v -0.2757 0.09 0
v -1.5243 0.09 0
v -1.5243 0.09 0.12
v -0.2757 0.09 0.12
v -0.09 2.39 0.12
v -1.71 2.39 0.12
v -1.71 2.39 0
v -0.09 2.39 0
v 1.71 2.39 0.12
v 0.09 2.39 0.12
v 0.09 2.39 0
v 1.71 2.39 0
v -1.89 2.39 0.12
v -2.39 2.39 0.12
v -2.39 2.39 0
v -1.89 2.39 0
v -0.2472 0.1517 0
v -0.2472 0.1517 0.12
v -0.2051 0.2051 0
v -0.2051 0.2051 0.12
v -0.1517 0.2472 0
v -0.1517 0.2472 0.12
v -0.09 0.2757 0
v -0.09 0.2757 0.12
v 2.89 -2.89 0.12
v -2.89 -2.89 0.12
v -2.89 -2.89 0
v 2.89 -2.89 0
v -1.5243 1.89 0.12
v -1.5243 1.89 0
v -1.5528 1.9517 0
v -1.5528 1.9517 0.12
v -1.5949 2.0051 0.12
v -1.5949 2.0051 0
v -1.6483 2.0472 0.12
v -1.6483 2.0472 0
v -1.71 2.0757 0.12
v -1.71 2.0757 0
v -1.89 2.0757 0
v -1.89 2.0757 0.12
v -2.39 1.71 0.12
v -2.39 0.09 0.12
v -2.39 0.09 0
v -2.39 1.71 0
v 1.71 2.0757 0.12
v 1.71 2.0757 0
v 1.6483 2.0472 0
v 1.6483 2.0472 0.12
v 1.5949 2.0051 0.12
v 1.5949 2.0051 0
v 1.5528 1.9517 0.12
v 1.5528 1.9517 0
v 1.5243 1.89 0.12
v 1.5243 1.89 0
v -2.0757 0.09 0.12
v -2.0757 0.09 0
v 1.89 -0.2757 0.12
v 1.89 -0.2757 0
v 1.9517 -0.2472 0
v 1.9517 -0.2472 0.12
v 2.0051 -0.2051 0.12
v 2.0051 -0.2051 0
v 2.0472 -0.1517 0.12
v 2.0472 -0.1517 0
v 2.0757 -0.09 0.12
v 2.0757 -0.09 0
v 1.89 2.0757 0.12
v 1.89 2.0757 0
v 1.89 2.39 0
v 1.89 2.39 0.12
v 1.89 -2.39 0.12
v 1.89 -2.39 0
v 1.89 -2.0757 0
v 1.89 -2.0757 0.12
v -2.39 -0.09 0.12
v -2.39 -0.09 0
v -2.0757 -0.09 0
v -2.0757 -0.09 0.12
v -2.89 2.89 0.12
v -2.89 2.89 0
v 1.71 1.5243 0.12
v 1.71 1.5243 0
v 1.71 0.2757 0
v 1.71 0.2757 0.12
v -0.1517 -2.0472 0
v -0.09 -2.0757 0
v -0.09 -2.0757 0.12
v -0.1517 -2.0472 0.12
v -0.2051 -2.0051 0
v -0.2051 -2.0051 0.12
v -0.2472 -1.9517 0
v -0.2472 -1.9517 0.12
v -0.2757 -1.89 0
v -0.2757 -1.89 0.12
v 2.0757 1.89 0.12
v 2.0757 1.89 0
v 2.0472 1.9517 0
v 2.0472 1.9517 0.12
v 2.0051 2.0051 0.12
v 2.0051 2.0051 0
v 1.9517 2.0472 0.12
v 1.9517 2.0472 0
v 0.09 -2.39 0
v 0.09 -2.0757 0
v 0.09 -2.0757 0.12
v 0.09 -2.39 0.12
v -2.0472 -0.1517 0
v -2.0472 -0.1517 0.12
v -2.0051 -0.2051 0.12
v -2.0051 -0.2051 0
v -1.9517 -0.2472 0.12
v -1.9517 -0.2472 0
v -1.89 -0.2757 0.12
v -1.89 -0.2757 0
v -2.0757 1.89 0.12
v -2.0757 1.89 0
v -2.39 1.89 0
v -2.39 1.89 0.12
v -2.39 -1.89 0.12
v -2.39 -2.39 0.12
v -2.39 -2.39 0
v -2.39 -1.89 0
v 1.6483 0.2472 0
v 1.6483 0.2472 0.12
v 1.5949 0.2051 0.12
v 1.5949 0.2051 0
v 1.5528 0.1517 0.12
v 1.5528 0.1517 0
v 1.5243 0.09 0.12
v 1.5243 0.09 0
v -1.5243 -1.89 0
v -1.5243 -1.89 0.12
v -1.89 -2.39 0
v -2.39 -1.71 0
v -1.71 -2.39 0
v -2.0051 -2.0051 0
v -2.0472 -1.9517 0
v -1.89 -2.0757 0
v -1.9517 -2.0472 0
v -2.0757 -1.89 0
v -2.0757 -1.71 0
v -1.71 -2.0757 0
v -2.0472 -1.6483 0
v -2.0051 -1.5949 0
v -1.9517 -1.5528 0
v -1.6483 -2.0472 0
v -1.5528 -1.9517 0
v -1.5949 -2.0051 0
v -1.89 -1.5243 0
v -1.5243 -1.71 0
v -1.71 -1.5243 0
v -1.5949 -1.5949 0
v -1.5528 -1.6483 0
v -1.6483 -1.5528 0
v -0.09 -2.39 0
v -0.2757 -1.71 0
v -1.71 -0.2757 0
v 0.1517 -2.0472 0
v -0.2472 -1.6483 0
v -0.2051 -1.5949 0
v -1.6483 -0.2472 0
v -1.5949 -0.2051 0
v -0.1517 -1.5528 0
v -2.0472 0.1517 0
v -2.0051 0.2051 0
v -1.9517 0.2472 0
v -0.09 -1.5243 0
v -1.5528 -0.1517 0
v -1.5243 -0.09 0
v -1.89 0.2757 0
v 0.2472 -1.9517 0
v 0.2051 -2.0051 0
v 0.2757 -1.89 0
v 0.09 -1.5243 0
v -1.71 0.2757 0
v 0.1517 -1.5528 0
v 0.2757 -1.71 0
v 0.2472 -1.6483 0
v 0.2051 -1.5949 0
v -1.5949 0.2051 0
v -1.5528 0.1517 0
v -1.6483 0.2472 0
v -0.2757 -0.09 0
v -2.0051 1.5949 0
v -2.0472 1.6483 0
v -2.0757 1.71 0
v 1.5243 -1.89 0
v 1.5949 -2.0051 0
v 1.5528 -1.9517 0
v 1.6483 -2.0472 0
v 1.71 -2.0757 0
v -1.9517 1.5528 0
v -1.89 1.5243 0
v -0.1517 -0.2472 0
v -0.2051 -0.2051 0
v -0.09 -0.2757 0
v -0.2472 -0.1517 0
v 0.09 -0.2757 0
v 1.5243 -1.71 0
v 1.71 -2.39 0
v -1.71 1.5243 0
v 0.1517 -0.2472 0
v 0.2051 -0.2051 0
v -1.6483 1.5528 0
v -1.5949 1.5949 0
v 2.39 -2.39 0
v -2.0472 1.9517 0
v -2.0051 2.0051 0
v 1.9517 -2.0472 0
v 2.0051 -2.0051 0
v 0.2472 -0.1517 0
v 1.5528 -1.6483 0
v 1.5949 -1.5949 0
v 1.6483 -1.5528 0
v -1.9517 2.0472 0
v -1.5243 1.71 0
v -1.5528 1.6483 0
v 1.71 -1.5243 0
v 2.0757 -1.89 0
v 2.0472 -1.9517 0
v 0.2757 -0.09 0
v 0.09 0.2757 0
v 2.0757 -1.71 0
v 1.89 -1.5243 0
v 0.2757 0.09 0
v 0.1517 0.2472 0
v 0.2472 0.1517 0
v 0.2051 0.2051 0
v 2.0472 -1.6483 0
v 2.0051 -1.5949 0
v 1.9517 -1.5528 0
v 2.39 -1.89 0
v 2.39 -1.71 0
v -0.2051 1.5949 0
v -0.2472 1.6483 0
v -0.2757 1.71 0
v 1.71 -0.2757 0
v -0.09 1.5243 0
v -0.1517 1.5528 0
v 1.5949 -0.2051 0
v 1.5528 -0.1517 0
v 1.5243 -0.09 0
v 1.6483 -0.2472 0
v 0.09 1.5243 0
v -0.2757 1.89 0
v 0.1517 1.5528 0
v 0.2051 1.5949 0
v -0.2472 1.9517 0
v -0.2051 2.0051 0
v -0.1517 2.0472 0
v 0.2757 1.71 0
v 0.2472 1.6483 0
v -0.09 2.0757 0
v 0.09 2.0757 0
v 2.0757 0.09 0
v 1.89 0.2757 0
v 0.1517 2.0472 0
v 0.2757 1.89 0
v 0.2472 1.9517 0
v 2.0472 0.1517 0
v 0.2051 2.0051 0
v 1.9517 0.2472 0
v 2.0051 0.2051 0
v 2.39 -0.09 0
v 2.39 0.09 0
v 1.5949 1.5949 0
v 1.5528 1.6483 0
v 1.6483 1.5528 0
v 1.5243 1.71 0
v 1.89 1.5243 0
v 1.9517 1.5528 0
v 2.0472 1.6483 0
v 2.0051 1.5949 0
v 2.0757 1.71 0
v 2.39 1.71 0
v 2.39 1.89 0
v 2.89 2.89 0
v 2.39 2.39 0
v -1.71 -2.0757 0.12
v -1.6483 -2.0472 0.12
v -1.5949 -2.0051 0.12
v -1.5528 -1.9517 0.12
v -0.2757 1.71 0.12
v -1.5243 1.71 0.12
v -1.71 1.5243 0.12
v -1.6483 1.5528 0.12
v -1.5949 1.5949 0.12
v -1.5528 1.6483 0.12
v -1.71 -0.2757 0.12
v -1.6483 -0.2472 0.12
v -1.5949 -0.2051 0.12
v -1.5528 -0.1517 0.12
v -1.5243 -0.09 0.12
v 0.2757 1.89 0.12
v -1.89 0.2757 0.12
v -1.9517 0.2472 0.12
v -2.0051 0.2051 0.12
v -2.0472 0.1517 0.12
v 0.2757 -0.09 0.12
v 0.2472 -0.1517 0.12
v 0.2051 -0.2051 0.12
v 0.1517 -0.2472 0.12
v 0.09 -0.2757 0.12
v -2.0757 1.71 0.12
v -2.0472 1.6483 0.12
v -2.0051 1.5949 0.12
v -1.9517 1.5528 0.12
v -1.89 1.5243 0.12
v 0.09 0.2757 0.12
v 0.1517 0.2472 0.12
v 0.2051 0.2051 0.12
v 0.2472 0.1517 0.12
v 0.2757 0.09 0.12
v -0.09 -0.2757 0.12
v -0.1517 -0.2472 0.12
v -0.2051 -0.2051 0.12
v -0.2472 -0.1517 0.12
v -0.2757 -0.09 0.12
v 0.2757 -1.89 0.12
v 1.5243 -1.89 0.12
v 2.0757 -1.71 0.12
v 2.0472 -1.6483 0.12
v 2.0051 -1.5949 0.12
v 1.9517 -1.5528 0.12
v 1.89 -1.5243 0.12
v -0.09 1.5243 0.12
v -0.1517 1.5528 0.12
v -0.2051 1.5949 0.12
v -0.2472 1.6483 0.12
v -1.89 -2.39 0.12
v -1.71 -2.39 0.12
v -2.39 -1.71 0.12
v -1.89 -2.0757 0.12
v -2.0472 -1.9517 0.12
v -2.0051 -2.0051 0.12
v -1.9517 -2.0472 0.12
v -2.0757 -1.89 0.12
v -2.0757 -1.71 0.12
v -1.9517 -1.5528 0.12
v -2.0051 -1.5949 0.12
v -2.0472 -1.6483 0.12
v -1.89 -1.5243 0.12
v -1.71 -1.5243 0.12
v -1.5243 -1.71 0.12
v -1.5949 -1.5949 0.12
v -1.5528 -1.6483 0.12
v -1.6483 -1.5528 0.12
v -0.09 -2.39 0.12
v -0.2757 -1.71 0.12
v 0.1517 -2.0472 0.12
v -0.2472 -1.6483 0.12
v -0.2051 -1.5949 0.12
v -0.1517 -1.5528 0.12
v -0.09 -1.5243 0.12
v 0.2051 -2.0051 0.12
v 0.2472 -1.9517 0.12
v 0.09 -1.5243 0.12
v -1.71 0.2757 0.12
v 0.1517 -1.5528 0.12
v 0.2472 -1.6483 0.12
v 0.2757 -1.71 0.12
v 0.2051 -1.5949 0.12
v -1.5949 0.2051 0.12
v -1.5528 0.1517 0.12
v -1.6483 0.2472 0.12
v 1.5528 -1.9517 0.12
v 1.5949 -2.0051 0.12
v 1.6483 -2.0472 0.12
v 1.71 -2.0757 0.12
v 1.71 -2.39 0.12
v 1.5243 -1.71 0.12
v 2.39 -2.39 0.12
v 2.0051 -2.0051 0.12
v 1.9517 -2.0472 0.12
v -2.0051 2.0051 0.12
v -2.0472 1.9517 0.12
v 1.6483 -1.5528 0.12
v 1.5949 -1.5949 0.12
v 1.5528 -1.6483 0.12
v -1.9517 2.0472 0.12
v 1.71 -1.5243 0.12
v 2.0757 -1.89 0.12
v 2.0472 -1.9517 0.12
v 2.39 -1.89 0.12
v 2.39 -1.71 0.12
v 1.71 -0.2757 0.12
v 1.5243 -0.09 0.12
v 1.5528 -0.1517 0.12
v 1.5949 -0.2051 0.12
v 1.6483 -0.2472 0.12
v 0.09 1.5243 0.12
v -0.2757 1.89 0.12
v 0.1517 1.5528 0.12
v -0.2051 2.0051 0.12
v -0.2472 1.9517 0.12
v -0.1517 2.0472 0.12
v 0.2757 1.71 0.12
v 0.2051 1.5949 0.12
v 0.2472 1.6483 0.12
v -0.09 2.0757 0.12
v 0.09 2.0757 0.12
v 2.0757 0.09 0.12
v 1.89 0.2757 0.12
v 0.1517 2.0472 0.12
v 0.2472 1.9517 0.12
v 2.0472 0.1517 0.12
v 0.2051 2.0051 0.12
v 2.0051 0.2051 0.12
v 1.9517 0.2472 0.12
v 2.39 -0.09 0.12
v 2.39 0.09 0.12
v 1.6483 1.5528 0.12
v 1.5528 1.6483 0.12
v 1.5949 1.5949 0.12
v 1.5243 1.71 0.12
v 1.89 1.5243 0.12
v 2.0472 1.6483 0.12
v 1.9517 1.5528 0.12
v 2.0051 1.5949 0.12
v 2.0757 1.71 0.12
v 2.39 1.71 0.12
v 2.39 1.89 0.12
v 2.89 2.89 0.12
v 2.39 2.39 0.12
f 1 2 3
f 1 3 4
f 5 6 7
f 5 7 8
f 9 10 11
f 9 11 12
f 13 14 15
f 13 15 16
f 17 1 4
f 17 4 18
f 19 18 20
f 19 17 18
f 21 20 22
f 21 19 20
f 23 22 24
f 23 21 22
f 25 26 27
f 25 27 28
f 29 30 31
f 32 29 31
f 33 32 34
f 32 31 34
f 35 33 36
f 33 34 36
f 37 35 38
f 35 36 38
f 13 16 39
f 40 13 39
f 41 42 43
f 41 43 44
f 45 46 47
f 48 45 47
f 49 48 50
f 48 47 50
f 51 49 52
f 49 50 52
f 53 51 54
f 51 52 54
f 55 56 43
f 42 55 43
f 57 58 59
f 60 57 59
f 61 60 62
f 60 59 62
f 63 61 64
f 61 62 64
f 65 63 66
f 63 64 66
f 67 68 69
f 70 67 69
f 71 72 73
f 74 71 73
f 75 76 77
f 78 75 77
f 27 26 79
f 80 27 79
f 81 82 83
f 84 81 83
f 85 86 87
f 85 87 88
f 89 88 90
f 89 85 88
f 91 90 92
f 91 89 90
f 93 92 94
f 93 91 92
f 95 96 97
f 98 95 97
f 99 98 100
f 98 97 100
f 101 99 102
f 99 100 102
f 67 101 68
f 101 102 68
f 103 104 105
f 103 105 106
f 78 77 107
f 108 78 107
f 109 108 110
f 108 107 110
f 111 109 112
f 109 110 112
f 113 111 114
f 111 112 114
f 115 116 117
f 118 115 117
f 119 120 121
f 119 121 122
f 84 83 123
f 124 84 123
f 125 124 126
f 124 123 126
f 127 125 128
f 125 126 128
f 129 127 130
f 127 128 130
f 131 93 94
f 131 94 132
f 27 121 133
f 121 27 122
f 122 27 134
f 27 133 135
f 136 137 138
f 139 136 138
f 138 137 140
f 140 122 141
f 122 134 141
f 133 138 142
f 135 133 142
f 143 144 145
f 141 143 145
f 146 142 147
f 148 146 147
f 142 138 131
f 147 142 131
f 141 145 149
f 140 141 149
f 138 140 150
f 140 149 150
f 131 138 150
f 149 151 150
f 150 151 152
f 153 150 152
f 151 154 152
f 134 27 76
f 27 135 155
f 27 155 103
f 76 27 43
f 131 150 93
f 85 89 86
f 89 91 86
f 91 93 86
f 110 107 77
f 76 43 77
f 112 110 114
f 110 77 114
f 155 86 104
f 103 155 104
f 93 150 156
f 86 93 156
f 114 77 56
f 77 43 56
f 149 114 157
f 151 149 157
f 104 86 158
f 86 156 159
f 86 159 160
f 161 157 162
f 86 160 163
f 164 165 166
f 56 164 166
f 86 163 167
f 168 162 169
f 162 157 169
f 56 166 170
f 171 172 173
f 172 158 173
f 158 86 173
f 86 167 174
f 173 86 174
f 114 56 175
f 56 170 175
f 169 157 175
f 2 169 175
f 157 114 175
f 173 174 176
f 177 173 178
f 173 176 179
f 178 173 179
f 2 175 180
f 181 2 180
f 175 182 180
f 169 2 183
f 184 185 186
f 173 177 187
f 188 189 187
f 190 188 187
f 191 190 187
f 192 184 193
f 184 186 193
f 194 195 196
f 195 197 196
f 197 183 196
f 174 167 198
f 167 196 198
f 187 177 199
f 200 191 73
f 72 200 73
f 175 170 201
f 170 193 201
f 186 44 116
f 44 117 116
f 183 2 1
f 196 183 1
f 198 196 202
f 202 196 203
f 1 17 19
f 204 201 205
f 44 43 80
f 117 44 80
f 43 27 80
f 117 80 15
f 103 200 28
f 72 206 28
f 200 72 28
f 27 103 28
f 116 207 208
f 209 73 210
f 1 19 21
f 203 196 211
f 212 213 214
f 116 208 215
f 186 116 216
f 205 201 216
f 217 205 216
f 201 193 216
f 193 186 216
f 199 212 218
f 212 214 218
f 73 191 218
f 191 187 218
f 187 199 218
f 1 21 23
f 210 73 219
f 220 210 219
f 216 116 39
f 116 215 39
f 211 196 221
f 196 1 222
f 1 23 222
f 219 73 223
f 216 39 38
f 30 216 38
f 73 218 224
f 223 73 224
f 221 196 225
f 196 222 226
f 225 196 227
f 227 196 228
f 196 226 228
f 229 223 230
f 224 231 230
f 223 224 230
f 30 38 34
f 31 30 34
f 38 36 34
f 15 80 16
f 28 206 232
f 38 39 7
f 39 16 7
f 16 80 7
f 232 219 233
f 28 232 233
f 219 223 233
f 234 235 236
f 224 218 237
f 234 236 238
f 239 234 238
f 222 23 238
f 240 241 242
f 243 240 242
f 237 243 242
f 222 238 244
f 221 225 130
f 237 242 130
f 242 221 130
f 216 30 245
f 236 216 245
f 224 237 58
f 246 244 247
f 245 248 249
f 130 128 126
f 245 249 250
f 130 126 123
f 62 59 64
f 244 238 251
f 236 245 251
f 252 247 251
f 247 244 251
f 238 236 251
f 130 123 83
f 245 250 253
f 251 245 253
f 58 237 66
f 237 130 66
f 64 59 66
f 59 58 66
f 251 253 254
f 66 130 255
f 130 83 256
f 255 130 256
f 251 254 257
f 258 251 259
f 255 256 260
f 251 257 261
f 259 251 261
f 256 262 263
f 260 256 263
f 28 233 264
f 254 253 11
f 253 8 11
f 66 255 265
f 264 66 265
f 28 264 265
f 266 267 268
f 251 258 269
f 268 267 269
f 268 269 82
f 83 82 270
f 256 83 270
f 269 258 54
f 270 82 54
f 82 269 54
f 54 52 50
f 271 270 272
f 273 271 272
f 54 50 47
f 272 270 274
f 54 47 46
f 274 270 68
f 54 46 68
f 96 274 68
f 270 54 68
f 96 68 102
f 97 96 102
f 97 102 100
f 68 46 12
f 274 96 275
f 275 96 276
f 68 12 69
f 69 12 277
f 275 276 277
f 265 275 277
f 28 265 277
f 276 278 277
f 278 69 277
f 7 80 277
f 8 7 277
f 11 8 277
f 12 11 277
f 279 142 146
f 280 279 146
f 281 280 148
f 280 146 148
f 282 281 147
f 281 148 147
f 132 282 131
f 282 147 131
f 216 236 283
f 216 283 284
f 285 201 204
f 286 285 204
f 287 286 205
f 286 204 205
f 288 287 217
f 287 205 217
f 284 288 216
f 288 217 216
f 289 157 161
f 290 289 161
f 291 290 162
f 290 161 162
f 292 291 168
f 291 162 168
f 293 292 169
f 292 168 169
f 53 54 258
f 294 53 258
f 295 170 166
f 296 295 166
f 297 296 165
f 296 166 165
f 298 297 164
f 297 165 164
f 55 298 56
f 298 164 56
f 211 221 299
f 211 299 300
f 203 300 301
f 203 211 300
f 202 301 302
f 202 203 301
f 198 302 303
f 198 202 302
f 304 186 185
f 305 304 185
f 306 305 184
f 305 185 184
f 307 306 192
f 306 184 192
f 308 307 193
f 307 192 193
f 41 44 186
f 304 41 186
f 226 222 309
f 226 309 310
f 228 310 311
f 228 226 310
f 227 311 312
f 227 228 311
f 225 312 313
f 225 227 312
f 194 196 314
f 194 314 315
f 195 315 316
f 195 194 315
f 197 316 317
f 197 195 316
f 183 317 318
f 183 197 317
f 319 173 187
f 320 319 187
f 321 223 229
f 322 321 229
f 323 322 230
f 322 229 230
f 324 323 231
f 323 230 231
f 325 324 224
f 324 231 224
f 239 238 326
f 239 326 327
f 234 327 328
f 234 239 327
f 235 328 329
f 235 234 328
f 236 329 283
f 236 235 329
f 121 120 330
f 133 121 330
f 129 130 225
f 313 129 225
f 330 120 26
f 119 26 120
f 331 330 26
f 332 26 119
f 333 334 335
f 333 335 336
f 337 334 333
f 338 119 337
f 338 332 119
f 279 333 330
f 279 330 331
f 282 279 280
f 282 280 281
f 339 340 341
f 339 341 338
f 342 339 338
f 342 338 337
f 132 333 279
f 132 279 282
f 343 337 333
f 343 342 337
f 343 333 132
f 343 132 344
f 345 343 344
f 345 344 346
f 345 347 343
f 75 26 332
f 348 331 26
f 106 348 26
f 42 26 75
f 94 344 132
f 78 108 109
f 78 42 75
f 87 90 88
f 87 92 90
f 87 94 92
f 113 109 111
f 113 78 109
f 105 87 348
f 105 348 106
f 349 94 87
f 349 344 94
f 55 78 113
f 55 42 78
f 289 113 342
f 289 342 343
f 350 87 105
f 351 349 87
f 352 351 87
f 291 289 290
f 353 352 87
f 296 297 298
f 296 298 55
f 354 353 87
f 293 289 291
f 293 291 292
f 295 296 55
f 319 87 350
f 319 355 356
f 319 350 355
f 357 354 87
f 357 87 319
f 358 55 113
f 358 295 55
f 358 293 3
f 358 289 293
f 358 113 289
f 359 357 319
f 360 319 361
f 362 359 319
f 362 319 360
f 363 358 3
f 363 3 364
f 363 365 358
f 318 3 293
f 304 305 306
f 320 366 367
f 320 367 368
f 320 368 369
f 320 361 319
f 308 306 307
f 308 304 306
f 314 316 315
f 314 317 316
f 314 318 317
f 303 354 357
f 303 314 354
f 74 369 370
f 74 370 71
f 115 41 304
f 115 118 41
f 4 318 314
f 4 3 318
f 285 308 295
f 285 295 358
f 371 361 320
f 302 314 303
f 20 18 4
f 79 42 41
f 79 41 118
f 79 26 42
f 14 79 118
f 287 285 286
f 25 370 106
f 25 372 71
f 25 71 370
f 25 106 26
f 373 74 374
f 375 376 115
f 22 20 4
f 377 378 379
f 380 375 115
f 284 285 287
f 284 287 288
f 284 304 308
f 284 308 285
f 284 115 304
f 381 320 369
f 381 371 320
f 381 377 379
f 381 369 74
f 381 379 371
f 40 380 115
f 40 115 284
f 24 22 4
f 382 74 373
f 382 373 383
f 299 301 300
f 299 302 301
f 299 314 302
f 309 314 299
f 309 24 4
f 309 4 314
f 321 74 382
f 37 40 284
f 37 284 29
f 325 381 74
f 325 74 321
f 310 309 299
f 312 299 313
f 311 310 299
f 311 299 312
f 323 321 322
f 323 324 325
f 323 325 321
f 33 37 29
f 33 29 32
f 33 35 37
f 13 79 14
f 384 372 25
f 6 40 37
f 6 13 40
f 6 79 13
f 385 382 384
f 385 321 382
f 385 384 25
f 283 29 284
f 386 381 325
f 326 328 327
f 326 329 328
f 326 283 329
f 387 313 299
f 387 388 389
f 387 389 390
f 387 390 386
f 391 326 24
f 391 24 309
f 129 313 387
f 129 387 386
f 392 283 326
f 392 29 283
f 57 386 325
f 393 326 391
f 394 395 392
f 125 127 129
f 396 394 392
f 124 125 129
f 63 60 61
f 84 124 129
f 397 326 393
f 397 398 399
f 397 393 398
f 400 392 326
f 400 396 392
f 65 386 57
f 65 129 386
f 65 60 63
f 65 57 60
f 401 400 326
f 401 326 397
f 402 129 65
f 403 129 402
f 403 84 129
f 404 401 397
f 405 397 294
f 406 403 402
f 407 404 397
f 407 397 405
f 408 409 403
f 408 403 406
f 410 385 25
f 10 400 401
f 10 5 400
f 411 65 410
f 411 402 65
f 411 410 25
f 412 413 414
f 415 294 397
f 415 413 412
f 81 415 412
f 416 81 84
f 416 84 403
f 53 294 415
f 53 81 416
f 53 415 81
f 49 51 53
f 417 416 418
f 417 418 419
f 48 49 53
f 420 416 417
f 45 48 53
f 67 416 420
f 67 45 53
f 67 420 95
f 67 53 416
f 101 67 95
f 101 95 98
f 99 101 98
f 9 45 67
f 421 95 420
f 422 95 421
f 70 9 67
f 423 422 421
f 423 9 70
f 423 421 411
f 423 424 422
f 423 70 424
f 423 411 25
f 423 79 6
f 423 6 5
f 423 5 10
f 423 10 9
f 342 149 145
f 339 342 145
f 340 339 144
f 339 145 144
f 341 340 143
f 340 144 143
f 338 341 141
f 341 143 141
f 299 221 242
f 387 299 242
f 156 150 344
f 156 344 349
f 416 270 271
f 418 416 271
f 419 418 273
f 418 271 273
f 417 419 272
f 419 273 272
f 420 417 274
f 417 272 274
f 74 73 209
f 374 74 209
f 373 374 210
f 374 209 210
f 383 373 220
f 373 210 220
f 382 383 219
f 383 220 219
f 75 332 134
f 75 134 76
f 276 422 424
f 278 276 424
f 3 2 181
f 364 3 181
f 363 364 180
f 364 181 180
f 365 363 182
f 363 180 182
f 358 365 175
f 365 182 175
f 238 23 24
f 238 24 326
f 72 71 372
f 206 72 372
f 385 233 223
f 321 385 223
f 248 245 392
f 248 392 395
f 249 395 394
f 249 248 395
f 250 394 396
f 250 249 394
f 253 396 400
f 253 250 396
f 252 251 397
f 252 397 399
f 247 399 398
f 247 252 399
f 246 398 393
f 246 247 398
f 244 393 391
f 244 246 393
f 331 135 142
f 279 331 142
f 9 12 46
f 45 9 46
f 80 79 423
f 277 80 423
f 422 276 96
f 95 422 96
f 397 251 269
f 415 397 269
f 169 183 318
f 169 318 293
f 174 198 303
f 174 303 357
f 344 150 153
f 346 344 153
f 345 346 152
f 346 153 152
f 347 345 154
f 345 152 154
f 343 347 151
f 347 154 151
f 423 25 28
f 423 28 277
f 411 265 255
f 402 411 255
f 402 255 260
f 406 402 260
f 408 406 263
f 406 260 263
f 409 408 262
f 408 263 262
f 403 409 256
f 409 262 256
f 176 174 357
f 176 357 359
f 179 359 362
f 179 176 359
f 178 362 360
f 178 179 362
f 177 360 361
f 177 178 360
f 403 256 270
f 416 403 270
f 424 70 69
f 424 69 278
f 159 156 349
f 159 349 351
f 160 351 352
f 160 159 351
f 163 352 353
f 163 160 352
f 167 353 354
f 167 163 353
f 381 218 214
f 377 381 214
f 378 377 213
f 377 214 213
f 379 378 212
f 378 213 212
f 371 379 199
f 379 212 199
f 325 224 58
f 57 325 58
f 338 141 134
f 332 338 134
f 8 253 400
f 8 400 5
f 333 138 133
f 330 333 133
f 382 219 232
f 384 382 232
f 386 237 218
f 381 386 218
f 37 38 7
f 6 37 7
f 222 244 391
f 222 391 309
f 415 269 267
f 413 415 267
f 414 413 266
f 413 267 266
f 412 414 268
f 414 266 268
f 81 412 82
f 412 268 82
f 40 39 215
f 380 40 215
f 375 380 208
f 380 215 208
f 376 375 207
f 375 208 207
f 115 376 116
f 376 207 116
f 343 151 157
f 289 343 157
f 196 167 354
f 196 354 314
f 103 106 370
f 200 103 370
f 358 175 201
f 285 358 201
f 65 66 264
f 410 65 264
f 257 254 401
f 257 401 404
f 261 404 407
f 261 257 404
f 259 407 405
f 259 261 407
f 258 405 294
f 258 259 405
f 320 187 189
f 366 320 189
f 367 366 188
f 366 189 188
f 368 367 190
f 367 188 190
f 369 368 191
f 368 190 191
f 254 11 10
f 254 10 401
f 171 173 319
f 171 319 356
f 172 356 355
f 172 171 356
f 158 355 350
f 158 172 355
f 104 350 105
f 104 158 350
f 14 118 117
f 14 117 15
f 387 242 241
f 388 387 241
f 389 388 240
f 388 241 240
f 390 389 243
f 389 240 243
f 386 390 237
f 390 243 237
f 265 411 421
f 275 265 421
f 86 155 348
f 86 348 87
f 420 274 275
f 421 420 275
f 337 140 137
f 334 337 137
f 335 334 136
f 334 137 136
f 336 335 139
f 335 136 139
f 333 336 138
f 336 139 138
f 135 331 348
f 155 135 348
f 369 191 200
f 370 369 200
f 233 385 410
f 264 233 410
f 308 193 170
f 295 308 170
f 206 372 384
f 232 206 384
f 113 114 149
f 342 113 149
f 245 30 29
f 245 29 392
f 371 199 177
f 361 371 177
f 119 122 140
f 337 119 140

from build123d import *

# Parameters (mm, degrees)
BOSS_EXTRUDE2_DEPTH        = 0.12
CIRPATTERN2_COUNT          = 4
LPATTERN5_COUNT            = 2
LPATTERN5_PITCH            = 1.8
LPATTERN5_COPY_1_DEPTH     = 0.12
LPATTERN5_COPY_2_DEPTH     = 0.12
LPATTERN5_COPY_3_DEPTH     = 0.12
LPATTERN5_COL_COUNT        = 2
LPATTERN5_COL_PITCH        = 1.8
LPATTERN5_COL_COPY_1_DEPTH = 0.12
LPATTERN5_COL_COPY_2_DEPTH = 0.12
LPATTERN5_COL_COPY_3_DEPTH = 0.12
LPATTERN6_DEPTH            = 0.12
SKETCH3_W                  = 8
SKETCH3_H                  = 8
SKETCH3_W_2                = 4.78
SKETCH3_H_2                = 4.78
CUT_EXTRUDE8_DEPTH         = 4.820261771
SKETCH7_W                  = 5.78
SKETCH7_H                  = 5.78
SKETCH7_W_2                = 4.78
SKETCH7_H_2                = 4.78
BOSS_EXTRUDE3_DEPTH        = 0.12


# Read off the part's stored shape, not the designer's step: LPattern6
with BuildPart() as part:
    # Sketch2 → Boss-Extrude2 (new body)
    with BuildSketch(Plane.XY):
        with BuildLine():
            Line((0.09, 0.9), (0.09, 0.275680975))
            ThreePointArc((0.09, 0.275680975), (0, -0.29), (-0.09, 0.275680975))
            Line((-0.09, 0.275680975), (-0.09, 0.9))
            Line((-0.09, 0.9), (0.09, 0.9))
        make_face()
    boss_extrude2 = extrude(amount=BOSS_EXTRUDE2_DEPTH)

    # CirPattern2: Boss-Extrude2 ×4 about axis
    cirpattern2_axis = Axis((0, 0, 0), (0, 0, 1))
    for i in range(1, CIRPATTERN2_COUNT):
        add(boss_extrude2.rotate(cirpattern2_axis, i * 360 / CIRPATTERN2_COUNT))



with BuildPart() as lpattern5_1:
    # LPattern5: Boss-Extrude2 ×2
    with Locations(*[(0, i * LPATTERN5_PITCH, 0) for i in range(1, LPATTERN5_COUNT)]):
        add(boss_extrude2)

    # LPattern5 copy 1 sketch → LPattern5 copy 1 (add)
    with BuildSketch(Plane(origin=(0, 1.8, 0), x_dir=(0, 1, 0), z_dir=(0, 0, 1))):
        with BuildLine():
            Line((0.09, 0.9), (0.09, 0.275680975))
            ThreePointArc((0.09, 0.275680975), (0, -0.29), (-0.09, 0.275680975))
            Line((-0.09, 0.275680975), (-0.09, 0.9))
            Line((-0.09, 0.9), (0.09, 0.9))
        make_face()
    extrude(amount=LPATTERN5_COPY_1_DEPTH)


with BuildPart() as part_1:
    add(part.part)

    add(lpattern5_1.part)  # LPattern5 copy 2 merges LPattern5_1
    # LPattern5 copy 2 sketch → LPattern5 copy 2 (add)
    with BuildSketch(Plane(origin=(0, 1.8, 0), x_dir=(-1, 0, 0), z_dir=(0, 0, 1))):
        with BuildLine():
            Line((0.09, 0.9), (0.09, 0.275680975))
            ThreePointArc((0.09, 0.275680975), (0, -0.29), (-0.09, 0.275680975))
            Line((-0.09, 0.275680975), (-0.09, 0.9))
            Line((-0.09, 0.9), (0.09, 0.9))
        make_face()
    extrude(amount=LPATTERN5_COPY_2_DEPTH)

    # LPattern5 copy 3 sketch → LPattern5 copy 3 (add)
    with BuildSketch(Plane(origin=(0, 1.8, 0), x_dir=(0, -1, 0), z_dir=(0, 0, 1))):
        with BuildLine():
            Line((0.09, 0.9), (0.09, 0.275680975))
            ThreePointArc((0.09, 0.275680975), (0, -0.29), (-0.09, 0.275680975))
            Line((-0.09, 0.275680975), (-0.09, 0.9))
            Line((-0.09, 0.9), (0.09, 0.9))
        make_face()
    extrude(amount=LPATTERN5_COPY_3_DEPTH)

    # LPattern5 col: Boss-Extrude2 ×2
    with Locations(*[(0, -i * LPATTERN5_COL_PITCH, 0) for i in range(1, LPATTERN5_COL_COUNT)]):
        add(boss_extrude2)

    # LPattern5 col copy 1 sketch → LPattern5 col copy 1 (add)
    with BuildSketch(Plane(origin=(0, -1.8, 0), x_dir=(0, 1, 0), z_dir=(0, 0, 1))):
        with BuildLine():
            Line((0.09, 0.9), (0.09, 0.275680975))
            ThreePointArc((0.09, 0.275680975), (0, -0.29), (-0.09, 0.275680975))
            Line((-0.09, 0.275680975), (-0.09, 0.9))
            Line((-0.09, 0.9), (0.09, 0.9))
        make_face()
    extrude(amount=LPATTERN5_COL_COPY_1_DEPTH)

    # LPattern5 col copy 2 sketch → LPattern5 col copy 2 (add)
    with BuildSketch(Plane(origin=(0, -1.8, 0), x_dir=(-1, 0, 0), z_dir=(0, 0, 1))):
        with BuildLine():
            Line((0.09, 0.9), (0.09, 0.275680975))
            ThreePointArc((0.09, 0.275680975), (0, -0.29), (-0.09, 0.275680975))
            Line((-0.09, 0.275680975), (-0.09, 0.9))
            Line((-0.09, 0.9), (0.09, 0.9))
        make_face()
    extrude(amount=LPATTERN5_COL_COPY_2_DEPTH)

    # LPattern5 col copy 3 sketch → LPattern5 col copy 3 (add)
    with BuildSketch(Plane(origin=(0, -1.8, 0), x_dir=(0, -1, 0), z_dir=(0, 0, 1))):
        with BuildLine():
            Line((0.09, 0.9), (0.09, 0.275680975))
            ThreePointArc((0.09, 0.275680975), (0, -0.29), (-0.09, 0.275680975))
            Line((-0.09, 0.275680975), (-0.09, 0.9))
            Line((-0.09, 0.9), (0.09, 0.9))
        make_face()
    extrude(amount=LPATTERN5_COL_COPY_3_DEPTH)

    # LPattern6 outline → LPattern6 (add)
    with BuildSketch(Plane.XY):
        with BuildLine():
            Line((1.524319025, 0.09), (0.9, 0.09))
            Line((0.9, 0.09), (0.9, -0.09))
            Line((0.9, -0.09), (1.524319025, -0.09))
            ThreePointArc((1.524319025, -0.09), (1.594939033, -0.205060967), (1.71, -0.275680975))
            Line((1.71, -0.275680975), (1.71, -1.524319025))
            ThreePointArc((1.71, -1.524319025), (1.594939033, -1.594939033), (1.524319025, -1.71))
            Line((1.524319025, -1.71), (0.9, -1.71))
            Line((0.9, -1.71), (0.9, -1.89))
            Line((0.9, -1.89), (1.524319025, -1.89))
            ThreePointArc((1.524319025, -1.89), (1.594939033, -2.005060967), (1.71, -2.075680975))
            Line((1.71, -2.075680975), (1.71, -2.7))
            Line((1.71, -2.7), (1.89, -2.7))
            Line((1.89, -2.7), (1.89, -2.075680975))
            ThreePointArc((1.89, -2.075680975), (2.005060967, -2.005060967), (2.075680975, -1.89))
            Line((2.075680975, -1.89), (2.7, -1.89))
            Line((2.7, -1.89), (2.7, -1.71))
            Line((2.7, -1.71), (2.075680975, -1.71))
            ThreePointArc((2.075680975, -1.71), (2.005060967, -1.594939033), (1.89, -1.524319025))
            Line((1.89, -1.524319025), (1.89, -0.275680975))
            ThreePointArc((1.89, -0.275680975), (2.005060967, -0.205060967), (2.075680975, -0.09))
            Line((2.075680975, -0.09), (2.7, -0.09))
            Line((2.7, -0.09), (2.7, 0.09))
            Line((2.7, 0.09), (2.075680975, 0.09))
            ThreePointArc((2.075680975, 0.09), (2.005060967, 0.205060967), (1.89, 0.275680975))
            Line((1.89, 0.275680975), (1.89, 1.524319025))
            ThreePointArc((1.89, 1.524319025), (2.005060967, 1.594939033), (2.075680975, 1.71))
            Line((2.075680975, 1.71), (2.7, 1.71))
            Line((2.7, 1.71), (2.7, 1.89))
            Line((2.7, 1.89), (2.075680975, 1.89))
            ThreePointArc((2.075680975, 1.89), (2.005060967, 2.005060967), (1.89, 2.075680975))
            Line((1.89, 2.075680975), (1.89, 2.7))
            Line((1.89, 2.7), (1.71, 2.7))
            Line((1.71, 2.7), (1.71, 2.075680975))
            ThreePointArc((1.71, 2.075680975), (1.594939033, 2.005060967), (1.524319025, 1.89))
            Line((1.524319025, 1.89), (0.9, 1.89))
            Line((0.9, 1.89), (0.9, 1.71))
            Line((0.9, 1.71), (1.524319025, 1.71))
            ThreePointArc((1.524319025, 1.71), (1.594939033, 1.594939033), (1.71, 1.524319025))
            Line((1.71, 1.524319025), (1.71, 0.275680975))
            ThreePointArc((1.71, 0.275680975), (1.594939033, 0.205060967), (1.524319025, 0.09))
        make_face()
        with BuildLine():
            Line((-0.9, -0.09), (-0.9, 0.09))
            Line((-0.9, 0.09), (-1.524319025, 0.09))
            ThreePointArc((-1.524319025, 0.09), (-1.594939033, 0.205060967), (-1.71, 0.275680975))
            Line((-1.71, 0.275680975), (-1.71, 1.524319025))
            ThreePointArc((-1.71, 1.524319025), (-1.594939033, 1.594939033), (-1.524319025, 1.71))
            Line((-1.524319025, 1.71), (-0.9, 1.71))
            Line((-0.9, 1.71), (-0.9, 1.89))
            Line((-0.9, 1.89), (-1.524319025, 1.89))
            ThreePointArc((-1.524319025, 1.89), (-1.594939033, 2.005060967), (-1.71, 2.075680975))
            Line((-1.71, 2.075680975), (-1.71, 2.7))
            Line((-1.71, 2.7), (-1.89, 2.7))
            Line((-1.89, 2.7), (-1.89, 2.075680975))
            ThreePointArc((-1.89, 2.075680975), (-2.005060967, 2.005060967), (-2.075680975, 1.89))
            Line((-2.075680975, 1.89), (-2.7, 1.89))
            Line((-2.7, 1.89), (-2.7, 1.71))
            Line((-2.7, 1.71), (-2.075680975, 1.71))
            ThreePointArc((-2.075680975, 1.71), (-2.005060967, 1.594939033), (-1.89, 1.524319025))
            Line((-1.89, 1.524319025), (-1.89, 0.275680975))
            ThreePointArc((-1.89, 0.275680975), (-2.005060967, 0.205060967), (-2.075680975, 0.09))
            Line((-2.075680975, 0.09), (-2.7, 0.09))
            Line((-2.7, 0.09), (-2.7, -0.09))
            Line((-2.7, -0.09), (-2.075680975, -0.09))
            ThreePointArc((-2.075680975, -0.09), (-2.005060967, -0.205060967), (-1.89, -0.275680975))
            Line((-1.89, -0.275680975), (-1.89, -1.524319025))
            ThreePointArc((-1.89, -1.524319025), (-2.005060967, -1.594939033), (-2.075680975, -1.71))
            Line((-2.075680975, -1.71), (-2.7, -1.71))
            Line((-2.7, -1.71), (-2.7, -1.89))
            Line((-2.7, -1.89), (-2.075680975, -1.89))
            ThreePointArc((-2.075680975, -1.89), (-2.005060967, -2.005060967), (-1.89, -2.075680975))
            Line((-1.89, -2.075680975), (-1.89, -2.7))
            Line((-1.89, -2.7), (-1.71, -2.7))
            Line((-1.71, -2.7), (-1.71, -2.075680975))
            ThreePointArc((-1.71, -2.075680975), (-1.594939033, -2.005060967), (-1.524319025, -1.89))
            Line((-1.524319025, -1.89), (-0.9, -1.89))
            Line((-0.9, -1.89), (-0.9, -1.71))
            Line((-0.9, -1.71), (-1.524319025, -1.71))
            ThreePointArc((-1.524319025, -1.71), (-1.594939033, -1.594939033), (-1.71, -1.524319025))
            Line((-1.71, -1.524319025), (-1.71, -0.275680975))
            ThreePointArc((-1.71, -0.275680975), (-1.594939033, -0.205060967), (-1.524319025, -0.09))
            Line((-1.524319025, -0.09), (-0.9, -0.09))
        make_face()
    extrude(amount=LPATTERN6_DEPTH)

    # Sketch3 → Cut-Extrude8 (cut, through all)
    with BuildSketch(Plane.XY):
        Rectangle(SKETCH3_W, SKETCH3_H)
        Rectangle(SKETCH3_W_2, SKETCH3_H_2, mode=Mode.SUBTRACT)
    extrude(amount=CUT_EXTRUDE8_DEPTH, mode=Mode.SUBTRACT)

    # Sketch7 → Boss-Extrude3 (add)
    with BuildSketch(Plane.XY.offset(0.12)):
        Rectangle(SKETCH7_W, SKETCH7_H)
        Rectangle(SKETCH7_W_2, SKETCH7_H_2, mode=Mode.SUBTRACT)
    extrude(amount=-BOSS_EXTRUDE3_DEPTH)


solid = part_1.part
